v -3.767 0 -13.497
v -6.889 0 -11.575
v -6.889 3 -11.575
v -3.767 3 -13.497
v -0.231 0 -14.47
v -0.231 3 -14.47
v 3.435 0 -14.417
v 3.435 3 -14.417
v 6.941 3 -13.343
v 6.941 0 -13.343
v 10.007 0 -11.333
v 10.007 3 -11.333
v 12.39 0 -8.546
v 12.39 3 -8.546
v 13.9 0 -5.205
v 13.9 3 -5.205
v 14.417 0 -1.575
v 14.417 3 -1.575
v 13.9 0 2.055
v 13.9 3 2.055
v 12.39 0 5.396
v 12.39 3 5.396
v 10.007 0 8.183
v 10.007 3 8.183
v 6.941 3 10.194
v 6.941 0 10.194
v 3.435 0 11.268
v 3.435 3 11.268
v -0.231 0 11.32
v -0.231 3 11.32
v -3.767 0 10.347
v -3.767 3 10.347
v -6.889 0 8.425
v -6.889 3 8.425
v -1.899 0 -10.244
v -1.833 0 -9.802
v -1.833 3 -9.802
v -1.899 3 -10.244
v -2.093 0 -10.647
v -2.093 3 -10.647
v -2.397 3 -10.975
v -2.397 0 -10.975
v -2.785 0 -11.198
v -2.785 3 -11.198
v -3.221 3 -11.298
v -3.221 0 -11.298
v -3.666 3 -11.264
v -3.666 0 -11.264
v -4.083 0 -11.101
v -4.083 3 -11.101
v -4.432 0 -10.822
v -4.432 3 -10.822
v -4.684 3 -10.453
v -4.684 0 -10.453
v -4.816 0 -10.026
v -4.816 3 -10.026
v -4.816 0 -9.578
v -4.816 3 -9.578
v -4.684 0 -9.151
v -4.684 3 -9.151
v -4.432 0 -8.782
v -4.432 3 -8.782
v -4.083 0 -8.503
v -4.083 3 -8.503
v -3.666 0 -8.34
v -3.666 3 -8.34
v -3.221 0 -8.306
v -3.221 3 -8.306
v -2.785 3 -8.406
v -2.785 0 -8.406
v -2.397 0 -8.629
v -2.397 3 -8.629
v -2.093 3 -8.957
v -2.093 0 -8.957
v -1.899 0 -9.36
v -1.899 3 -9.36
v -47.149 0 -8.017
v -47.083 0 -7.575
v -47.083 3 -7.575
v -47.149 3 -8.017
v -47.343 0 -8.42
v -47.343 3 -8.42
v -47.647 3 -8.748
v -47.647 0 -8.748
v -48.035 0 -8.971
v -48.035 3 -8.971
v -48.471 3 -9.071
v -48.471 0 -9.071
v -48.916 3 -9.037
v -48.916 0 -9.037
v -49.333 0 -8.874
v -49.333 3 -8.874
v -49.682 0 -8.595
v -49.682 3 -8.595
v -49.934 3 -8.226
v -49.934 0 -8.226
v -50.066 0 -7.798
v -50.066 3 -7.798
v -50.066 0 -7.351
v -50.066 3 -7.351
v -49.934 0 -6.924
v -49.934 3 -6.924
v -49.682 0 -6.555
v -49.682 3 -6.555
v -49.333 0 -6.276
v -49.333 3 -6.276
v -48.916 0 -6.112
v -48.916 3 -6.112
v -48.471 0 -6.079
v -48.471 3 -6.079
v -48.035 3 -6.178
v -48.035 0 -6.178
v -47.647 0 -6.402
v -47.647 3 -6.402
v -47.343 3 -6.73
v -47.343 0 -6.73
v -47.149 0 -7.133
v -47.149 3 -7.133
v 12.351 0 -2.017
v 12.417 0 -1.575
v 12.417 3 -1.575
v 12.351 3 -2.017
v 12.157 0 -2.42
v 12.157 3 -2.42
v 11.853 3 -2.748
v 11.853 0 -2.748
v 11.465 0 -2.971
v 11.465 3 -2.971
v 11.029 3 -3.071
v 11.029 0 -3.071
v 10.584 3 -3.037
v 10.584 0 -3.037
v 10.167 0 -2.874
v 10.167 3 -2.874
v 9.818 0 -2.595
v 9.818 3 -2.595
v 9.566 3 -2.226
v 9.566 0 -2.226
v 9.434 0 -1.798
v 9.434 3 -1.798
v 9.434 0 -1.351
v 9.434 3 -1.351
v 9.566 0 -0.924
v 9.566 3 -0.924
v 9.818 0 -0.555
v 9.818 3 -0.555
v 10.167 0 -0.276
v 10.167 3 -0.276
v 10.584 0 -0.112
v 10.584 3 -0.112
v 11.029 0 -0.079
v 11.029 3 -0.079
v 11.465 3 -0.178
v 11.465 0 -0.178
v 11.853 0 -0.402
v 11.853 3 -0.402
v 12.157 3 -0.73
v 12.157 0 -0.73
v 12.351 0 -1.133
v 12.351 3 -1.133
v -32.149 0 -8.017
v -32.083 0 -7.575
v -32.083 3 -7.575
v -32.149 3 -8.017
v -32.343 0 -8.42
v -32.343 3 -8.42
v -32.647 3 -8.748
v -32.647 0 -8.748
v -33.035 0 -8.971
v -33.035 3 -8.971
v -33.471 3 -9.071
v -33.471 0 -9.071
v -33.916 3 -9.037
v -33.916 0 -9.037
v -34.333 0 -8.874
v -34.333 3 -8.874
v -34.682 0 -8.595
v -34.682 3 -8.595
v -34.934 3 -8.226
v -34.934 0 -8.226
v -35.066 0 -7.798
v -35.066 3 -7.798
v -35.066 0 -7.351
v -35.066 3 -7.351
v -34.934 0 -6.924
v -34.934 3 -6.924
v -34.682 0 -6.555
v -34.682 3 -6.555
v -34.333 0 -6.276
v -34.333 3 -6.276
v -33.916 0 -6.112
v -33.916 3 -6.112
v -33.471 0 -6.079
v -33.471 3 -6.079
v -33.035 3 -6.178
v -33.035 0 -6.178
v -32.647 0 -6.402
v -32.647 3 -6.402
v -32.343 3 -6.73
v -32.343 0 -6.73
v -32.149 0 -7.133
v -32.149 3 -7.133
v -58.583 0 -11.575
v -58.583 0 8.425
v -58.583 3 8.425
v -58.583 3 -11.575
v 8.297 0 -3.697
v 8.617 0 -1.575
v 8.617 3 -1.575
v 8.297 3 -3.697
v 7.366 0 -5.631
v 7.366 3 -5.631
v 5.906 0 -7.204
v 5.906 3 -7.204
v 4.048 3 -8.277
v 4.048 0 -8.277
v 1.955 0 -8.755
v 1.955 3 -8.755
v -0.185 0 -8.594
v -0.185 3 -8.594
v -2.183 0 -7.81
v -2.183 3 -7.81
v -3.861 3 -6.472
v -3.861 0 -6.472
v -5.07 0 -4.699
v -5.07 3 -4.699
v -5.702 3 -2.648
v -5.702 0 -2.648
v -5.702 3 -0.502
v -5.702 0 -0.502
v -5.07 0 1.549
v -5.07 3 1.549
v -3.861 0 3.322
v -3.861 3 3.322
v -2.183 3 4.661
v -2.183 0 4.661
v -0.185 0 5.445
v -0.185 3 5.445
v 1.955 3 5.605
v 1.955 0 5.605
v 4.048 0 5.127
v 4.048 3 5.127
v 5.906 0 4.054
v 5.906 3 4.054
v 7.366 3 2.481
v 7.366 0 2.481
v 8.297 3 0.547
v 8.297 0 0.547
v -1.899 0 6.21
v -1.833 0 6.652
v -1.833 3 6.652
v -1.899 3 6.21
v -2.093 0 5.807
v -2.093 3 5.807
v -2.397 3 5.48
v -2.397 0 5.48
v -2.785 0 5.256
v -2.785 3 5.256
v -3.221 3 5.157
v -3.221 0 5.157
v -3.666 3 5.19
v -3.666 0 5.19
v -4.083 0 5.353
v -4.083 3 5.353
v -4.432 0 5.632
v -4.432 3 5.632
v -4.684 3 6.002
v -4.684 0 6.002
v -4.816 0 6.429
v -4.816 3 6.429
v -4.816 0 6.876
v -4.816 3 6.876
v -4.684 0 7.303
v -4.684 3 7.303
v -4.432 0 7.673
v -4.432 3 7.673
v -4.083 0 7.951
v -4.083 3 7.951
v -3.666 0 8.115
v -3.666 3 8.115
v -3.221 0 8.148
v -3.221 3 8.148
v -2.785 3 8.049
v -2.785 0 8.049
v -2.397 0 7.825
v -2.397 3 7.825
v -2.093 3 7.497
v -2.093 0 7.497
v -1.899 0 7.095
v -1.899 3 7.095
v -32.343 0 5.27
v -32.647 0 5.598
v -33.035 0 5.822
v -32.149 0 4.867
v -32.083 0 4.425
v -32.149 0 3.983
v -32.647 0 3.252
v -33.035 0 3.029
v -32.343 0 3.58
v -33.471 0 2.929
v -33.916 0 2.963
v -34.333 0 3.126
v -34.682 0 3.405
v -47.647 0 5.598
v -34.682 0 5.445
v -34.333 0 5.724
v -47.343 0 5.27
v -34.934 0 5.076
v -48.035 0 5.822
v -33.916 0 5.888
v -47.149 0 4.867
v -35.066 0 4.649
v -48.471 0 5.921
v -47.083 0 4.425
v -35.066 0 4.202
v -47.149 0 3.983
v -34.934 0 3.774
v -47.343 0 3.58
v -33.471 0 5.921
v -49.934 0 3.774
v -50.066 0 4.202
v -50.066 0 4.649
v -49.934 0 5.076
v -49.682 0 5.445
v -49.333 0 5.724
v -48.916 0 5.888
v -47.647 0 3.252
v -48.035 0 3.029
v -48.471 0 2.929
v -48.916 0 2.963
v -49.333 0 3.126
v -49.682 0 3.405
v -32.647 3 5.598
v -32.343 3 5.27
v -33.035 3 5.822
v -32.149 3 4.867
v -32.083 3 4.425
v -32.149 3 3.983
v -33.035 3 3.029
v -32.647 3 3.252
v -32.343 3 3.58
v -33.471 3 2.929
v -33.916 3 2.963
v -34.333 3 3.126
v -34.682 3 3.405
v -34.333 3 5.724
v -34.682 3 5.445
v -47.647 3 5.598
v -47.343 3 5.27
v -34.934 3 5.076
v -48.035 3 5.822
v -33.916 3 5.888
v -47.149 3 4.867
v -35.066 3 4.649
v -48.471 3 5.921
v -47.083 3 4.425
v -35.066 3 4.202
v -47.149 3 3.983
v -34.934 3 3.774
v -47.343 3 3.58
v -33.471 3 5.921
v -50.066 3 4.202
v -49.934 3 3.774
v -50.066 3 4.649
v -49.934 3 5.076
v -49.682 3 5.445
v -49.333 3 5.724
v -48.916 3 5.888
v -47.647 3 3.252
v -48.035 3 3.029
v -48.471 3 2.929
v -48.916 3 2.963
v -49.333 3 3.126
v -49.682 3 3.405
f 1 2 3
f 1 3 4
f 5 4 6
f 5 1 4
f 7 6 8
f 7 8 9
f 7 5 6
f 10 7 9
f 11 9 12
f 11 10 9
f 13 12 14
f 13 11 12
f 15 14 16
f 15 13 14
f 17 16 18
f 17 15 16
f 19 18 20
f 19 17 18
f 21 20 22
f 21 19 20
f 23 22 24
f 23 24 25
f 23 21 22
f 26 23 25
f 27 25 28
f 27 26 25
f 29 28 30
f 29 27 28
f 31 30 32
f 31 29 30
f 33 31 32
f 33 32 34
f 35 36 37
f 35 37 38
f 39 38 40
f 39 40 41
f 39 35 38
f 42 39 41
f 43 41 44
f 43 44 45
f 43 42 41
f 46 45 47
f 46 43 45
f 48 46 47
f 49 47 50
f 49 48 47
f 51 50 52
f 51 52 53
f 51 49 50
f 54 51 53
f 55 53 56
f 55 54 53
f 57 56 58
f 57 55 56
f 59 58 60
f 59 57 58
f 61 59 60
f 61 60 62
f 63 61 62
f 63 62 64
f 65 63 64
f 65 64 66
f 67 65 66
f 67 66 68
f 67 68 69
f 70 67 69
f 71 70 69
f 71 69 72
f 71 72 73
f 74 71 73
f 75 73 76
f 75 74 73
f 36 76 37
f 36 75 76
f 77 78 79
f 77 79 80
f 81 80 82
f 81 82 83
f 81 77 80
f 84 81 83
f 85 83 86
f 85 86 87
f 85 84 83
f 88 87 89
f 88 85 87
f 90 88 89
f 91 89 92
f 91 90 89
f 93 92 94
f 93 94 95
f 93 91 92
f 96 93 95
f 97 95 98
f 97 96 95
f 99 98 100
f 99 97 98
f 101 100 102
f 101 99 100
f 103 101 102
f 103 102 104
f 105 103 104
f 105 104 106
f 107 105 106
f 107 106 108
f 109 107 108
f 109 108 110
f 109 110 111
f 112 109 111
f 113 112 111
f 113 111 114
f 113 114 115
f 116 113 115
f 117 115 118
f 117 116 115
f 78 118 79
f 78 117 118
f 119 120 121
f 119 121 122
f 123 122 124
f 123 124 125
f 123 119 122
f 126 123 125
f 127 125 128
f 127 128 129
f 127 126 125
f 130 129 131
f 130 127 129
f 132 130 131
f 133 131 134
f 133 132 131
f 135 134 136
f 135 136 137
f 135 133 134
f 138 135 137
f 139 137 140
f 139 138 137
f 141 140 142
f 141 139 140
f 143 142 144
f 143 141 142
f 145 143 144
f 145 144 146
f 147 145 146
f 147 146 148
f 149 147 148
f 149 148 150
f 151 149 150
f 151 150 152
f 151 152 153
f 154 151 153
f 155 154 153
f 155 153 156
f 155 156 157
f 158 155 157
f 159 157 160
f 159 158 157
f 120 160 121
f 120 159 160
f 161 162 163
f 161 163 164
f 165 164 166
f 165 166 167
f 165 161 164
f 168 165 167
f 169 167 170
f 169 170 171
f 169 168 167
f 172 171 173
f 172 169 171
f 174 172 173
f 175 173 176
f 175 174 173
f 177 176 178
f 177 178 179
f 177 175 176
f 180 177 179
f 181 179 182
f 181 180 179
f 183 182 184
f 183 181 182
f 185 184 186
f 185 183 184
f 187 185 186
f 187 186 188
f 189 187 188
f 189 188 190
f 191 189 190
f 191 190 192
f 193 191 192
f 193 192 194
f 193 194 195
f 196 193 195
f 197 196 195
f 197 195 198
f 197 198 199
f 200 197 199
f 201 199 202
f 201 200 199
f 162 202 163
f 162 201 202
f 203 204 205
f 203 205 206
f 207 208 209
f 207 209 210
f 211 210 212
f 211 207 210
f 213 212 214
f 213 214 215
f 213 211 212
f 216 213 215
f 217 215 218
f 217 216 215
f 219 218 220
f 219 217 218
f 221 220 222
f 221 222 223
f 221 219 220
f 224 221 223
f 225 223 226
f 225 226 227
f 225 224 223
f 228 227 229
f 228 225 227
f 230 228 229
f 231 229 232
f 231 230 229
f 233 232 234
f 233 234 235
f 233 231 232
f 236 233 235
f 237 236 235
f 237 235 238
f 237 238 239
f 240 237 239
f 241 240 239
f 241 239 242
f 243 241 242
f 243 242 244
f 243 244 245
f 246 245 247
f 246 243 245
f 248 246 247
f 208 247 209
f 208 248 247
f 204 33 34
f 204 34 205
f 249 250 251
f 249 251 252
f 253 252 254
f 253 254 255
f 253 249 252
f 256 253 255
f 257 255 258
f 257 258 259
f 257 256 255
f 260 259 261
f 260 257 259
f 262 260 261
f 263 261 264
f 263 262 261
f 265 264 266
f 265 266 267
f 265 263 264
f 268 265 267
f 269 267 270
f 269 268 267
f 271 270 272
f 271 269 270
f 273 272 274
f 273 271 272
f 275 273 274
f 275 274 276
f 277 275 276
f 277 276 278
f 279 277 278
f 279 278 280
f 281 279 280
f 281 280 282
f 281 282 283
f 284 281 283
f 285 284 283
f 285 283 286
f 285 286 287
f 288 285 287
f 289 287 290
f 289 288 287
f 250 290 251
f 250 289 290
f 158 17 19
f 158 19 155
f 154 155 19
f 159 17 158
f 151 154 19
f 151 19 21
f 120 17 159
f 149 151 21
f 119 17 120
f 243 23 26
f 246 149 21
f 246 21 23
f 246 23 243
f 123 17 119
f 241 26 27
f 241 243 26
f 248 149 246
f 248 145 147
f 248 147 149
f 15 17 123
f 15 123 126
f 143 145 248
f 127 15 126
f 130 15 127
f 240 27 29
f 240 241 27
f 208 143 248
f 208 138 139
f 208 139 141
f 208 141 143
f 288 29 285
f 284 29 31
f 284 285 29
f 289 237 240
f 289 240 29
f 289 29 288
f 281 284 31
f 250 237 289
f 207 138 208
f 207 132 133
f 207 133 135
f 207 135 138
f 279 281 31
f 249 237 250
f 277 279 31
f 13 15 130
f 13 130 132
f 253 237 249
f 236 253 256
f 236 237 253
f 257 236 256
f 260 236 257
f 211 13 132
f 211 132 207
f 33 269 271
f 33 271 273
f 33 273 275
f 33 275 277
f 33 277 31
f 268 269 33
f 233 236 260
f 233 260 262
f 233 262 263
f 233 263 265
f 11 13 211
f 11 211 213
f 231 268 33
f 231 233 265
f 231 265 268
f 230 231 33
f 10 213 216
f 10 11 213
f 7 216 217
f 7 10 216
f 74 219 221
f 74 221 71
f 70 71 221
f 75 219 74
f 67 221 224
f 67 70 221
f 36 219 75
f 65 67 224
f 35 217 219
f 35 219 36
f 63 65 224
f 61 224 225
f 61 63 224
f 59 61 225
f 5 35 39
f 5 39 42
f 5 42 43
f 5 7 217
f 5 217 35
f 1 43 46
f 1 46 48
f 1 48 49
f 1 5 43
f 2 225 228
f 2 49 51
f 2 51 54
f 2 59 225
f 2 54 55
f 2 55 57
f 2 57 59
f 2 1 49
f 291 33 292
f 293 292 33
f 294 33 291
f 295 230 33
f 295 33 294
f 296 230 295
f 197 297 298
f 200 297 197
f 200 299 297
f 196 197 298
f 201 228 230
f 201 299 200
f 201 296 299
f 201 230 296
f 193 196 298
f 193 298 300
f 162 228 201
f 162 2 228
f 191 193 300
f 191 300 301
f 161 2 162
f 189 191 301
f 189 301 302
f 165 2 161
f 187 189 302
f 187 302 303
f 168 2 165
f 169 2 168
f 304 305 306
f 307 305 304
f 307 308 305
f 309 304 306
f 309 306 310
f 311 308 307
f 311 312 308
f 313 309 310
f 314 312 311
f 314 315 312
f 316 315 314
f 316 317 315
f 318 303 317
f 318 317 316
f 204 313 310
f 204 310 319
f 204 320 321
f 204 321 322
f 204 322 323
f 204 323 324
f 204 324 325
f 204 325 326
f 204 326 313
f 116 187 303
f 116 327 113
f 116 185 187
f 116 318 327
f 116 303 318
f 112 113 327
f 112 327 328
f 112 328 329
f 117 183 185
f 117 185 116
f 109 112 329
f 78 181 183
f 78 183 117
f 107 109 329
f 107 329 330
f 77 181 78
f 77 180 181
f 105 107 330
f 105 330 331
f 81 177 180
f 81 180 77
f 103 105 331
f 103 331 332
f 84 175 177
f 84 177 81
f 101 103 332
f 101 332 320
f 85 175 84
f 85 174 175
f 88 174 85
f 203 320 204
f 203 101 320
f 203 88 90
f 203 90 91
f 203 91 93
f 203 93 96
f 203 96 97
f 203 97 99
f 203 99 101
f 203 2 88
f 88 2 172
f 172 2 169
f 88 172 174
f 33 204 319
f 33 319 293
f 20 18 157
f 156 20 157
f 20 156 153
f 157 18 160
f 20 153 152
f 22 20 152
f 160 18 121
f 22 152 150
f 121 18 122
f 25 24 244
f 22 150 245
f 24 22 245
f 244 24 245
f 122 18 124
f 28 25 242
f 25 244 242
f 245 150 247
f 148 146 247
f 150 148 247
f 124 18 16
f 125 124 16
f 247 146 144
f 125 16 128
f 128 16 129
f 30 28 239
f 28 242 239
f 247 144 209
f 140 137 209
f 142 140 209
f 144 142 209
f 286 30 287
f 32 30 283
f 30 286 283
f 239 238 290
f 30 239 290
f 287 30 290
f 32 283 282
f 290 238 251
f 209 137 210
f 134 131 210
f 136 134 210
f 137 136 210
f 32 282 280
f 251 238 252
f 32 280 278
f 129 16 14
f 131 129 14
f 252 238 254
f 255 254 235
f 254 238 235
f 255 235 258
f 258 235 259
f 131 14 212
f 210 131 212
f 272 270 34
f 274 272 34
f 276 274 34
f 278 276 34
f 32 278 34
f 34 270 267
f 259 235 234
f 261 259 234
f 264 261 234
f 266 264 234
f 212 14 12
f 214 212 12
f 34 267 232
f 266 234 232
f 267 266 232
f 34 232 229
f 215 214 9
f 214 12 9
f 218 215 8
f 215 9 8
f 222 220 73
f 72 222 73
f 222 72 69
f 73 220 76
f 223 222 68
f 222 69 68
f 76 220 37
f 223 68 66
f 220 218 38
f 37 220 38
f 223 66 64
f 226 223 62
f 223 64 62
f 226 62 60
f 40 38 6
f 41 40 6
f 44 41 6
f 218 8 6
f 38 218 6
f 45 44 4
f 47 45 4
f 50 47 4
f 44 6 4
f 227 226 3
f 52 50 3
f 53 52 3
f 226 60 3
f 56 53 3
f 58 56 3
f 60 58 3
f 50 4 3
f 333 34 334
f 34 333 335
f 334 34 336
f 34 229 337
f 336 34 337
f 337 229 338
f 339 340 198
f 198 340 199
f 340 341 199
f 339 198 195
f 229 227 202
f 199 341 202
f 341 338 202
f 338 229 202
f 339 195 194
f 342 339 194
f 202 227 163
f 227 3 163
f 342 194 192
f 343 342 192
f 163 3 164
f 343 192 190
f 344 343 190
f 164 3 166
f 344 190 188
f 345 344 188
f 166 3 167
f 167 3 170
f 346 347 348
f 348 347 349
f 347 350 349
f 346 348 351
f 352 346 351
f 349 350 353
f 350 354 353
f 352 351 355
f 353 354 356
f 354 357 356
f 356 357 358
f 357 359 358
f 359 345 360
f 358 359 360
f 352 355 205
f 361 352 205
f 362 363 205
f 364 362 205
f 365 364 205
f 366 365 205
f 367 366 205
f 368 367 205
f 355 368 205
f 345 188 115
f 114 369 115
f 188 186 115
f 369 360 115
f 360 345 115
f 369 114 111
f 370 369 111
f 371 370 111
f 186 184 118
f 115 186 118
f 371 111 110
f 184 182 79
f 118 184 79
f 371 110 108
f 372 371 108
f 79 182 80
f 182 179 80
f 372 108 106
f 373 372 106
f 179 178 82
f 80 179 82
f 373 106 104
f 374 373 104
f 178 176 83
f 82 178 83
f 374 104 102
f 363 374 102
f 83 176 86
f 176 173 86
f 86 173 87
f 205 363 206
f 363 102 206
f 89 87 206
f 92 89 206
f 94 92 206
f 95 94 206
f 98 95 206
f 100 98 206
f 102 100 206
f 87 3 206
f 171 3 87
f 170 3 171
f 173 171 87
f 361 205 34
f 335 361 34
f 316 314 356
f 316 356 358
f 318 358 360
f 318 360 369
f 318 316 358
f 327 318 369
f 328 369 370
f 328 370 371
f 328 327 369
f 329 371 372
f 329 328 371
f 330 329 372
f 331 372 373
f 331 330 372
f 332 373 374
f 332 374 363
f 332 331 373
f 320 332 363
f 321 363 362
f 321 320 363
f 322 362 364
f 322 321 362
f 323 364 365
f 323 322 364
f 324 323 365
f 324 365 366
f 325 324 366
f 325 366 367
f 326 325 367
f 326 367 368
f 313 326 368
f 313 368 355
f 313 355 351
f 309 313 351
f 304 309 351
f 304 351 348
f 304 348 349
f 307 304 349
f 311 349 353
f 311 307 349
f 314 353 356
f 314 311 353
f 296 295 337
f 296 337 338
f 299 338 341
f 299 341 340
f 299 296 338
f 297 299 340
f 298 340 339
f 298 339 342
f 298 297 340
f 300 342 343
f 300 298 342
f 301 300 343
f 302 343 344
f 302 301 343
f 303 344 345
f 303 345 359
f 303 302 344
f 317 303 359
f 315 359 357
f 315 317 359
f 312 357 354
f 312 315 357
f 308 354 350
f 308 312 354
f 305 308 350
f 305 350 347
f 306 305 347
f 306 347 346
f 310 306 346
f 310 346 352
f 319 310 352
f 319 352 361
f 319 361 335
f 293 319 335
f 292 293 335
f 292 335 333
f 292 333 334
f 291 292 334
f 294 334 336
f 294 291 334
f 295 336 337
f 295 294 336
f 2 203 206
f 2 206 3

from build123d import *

# Parameters (mm, degrees)
SKETCH_1_R      = 1.5
SKETCH_1_R_2    = 7.2
EXTRUDE_1_DEPTH = 3


with BuildPart() as part:
    # 草图1 → 凸台-拉伸1 (new body)
    with BuildSketch(Plane(origin=(0, 0, 0), x_dir=(1, 0, 0), z_dir=(0, 1, 0))):
        with BuildLine():
            Line((-58.582677165, 11.57480315), (-6.889301028, 11.57480315))
            ThreePointArc((-6.889301028, 11.57480315), (14.417322835, 1.57480315), (-6.889301028, -8.42519685))
            Line((-6.889301028, -8.42519685), (-58.582677165, -8.42519685))
            Line((-58.582677165, -8.42519685), (-58.582677165, 11.57480315))
        make_face()
        with Locations((-33.582677165, 7.57480315)):
            Circle(SKETCH_1_R, mode=Mode.SUBTRACT)
        with Locations((-48.582677165, 7.57480315)):
            Circle(SKETCH_1_R, mode=Mode.SUBTRACT)
        with Locations((-33.582677165, -4.42519685)):
            Circle(SKETCH_1_R, mode=Mode.SUBTRACT)
        with Locations((-48.582677165, -4.42519685)):
            Circle(SKETCH_1_R, mode=Mode.SUBTRACT)
        with Locations((1.417322835, 1.57480315)):
            Circle(SKETCH_1_R_2, mode=Mode.SUBTRACT)
        with Locations((10.917322835, 1.57480315)):
            Circle(SKETCH_1_R, mode=Mode.SUBTRACT)
        with Locations((-3.332677165, -6.652438186)):
            Circle(SKETCH_1_R, mode=Mode.SUBTRACT)
        with Locations((-3.332677165, 9.802044486)):
            Circle(SKETCH_1_R, mode=Mode.SUBTRACT)
    extrude(amount=EXTRUDE_1_DEPTH)


solid = part.part
